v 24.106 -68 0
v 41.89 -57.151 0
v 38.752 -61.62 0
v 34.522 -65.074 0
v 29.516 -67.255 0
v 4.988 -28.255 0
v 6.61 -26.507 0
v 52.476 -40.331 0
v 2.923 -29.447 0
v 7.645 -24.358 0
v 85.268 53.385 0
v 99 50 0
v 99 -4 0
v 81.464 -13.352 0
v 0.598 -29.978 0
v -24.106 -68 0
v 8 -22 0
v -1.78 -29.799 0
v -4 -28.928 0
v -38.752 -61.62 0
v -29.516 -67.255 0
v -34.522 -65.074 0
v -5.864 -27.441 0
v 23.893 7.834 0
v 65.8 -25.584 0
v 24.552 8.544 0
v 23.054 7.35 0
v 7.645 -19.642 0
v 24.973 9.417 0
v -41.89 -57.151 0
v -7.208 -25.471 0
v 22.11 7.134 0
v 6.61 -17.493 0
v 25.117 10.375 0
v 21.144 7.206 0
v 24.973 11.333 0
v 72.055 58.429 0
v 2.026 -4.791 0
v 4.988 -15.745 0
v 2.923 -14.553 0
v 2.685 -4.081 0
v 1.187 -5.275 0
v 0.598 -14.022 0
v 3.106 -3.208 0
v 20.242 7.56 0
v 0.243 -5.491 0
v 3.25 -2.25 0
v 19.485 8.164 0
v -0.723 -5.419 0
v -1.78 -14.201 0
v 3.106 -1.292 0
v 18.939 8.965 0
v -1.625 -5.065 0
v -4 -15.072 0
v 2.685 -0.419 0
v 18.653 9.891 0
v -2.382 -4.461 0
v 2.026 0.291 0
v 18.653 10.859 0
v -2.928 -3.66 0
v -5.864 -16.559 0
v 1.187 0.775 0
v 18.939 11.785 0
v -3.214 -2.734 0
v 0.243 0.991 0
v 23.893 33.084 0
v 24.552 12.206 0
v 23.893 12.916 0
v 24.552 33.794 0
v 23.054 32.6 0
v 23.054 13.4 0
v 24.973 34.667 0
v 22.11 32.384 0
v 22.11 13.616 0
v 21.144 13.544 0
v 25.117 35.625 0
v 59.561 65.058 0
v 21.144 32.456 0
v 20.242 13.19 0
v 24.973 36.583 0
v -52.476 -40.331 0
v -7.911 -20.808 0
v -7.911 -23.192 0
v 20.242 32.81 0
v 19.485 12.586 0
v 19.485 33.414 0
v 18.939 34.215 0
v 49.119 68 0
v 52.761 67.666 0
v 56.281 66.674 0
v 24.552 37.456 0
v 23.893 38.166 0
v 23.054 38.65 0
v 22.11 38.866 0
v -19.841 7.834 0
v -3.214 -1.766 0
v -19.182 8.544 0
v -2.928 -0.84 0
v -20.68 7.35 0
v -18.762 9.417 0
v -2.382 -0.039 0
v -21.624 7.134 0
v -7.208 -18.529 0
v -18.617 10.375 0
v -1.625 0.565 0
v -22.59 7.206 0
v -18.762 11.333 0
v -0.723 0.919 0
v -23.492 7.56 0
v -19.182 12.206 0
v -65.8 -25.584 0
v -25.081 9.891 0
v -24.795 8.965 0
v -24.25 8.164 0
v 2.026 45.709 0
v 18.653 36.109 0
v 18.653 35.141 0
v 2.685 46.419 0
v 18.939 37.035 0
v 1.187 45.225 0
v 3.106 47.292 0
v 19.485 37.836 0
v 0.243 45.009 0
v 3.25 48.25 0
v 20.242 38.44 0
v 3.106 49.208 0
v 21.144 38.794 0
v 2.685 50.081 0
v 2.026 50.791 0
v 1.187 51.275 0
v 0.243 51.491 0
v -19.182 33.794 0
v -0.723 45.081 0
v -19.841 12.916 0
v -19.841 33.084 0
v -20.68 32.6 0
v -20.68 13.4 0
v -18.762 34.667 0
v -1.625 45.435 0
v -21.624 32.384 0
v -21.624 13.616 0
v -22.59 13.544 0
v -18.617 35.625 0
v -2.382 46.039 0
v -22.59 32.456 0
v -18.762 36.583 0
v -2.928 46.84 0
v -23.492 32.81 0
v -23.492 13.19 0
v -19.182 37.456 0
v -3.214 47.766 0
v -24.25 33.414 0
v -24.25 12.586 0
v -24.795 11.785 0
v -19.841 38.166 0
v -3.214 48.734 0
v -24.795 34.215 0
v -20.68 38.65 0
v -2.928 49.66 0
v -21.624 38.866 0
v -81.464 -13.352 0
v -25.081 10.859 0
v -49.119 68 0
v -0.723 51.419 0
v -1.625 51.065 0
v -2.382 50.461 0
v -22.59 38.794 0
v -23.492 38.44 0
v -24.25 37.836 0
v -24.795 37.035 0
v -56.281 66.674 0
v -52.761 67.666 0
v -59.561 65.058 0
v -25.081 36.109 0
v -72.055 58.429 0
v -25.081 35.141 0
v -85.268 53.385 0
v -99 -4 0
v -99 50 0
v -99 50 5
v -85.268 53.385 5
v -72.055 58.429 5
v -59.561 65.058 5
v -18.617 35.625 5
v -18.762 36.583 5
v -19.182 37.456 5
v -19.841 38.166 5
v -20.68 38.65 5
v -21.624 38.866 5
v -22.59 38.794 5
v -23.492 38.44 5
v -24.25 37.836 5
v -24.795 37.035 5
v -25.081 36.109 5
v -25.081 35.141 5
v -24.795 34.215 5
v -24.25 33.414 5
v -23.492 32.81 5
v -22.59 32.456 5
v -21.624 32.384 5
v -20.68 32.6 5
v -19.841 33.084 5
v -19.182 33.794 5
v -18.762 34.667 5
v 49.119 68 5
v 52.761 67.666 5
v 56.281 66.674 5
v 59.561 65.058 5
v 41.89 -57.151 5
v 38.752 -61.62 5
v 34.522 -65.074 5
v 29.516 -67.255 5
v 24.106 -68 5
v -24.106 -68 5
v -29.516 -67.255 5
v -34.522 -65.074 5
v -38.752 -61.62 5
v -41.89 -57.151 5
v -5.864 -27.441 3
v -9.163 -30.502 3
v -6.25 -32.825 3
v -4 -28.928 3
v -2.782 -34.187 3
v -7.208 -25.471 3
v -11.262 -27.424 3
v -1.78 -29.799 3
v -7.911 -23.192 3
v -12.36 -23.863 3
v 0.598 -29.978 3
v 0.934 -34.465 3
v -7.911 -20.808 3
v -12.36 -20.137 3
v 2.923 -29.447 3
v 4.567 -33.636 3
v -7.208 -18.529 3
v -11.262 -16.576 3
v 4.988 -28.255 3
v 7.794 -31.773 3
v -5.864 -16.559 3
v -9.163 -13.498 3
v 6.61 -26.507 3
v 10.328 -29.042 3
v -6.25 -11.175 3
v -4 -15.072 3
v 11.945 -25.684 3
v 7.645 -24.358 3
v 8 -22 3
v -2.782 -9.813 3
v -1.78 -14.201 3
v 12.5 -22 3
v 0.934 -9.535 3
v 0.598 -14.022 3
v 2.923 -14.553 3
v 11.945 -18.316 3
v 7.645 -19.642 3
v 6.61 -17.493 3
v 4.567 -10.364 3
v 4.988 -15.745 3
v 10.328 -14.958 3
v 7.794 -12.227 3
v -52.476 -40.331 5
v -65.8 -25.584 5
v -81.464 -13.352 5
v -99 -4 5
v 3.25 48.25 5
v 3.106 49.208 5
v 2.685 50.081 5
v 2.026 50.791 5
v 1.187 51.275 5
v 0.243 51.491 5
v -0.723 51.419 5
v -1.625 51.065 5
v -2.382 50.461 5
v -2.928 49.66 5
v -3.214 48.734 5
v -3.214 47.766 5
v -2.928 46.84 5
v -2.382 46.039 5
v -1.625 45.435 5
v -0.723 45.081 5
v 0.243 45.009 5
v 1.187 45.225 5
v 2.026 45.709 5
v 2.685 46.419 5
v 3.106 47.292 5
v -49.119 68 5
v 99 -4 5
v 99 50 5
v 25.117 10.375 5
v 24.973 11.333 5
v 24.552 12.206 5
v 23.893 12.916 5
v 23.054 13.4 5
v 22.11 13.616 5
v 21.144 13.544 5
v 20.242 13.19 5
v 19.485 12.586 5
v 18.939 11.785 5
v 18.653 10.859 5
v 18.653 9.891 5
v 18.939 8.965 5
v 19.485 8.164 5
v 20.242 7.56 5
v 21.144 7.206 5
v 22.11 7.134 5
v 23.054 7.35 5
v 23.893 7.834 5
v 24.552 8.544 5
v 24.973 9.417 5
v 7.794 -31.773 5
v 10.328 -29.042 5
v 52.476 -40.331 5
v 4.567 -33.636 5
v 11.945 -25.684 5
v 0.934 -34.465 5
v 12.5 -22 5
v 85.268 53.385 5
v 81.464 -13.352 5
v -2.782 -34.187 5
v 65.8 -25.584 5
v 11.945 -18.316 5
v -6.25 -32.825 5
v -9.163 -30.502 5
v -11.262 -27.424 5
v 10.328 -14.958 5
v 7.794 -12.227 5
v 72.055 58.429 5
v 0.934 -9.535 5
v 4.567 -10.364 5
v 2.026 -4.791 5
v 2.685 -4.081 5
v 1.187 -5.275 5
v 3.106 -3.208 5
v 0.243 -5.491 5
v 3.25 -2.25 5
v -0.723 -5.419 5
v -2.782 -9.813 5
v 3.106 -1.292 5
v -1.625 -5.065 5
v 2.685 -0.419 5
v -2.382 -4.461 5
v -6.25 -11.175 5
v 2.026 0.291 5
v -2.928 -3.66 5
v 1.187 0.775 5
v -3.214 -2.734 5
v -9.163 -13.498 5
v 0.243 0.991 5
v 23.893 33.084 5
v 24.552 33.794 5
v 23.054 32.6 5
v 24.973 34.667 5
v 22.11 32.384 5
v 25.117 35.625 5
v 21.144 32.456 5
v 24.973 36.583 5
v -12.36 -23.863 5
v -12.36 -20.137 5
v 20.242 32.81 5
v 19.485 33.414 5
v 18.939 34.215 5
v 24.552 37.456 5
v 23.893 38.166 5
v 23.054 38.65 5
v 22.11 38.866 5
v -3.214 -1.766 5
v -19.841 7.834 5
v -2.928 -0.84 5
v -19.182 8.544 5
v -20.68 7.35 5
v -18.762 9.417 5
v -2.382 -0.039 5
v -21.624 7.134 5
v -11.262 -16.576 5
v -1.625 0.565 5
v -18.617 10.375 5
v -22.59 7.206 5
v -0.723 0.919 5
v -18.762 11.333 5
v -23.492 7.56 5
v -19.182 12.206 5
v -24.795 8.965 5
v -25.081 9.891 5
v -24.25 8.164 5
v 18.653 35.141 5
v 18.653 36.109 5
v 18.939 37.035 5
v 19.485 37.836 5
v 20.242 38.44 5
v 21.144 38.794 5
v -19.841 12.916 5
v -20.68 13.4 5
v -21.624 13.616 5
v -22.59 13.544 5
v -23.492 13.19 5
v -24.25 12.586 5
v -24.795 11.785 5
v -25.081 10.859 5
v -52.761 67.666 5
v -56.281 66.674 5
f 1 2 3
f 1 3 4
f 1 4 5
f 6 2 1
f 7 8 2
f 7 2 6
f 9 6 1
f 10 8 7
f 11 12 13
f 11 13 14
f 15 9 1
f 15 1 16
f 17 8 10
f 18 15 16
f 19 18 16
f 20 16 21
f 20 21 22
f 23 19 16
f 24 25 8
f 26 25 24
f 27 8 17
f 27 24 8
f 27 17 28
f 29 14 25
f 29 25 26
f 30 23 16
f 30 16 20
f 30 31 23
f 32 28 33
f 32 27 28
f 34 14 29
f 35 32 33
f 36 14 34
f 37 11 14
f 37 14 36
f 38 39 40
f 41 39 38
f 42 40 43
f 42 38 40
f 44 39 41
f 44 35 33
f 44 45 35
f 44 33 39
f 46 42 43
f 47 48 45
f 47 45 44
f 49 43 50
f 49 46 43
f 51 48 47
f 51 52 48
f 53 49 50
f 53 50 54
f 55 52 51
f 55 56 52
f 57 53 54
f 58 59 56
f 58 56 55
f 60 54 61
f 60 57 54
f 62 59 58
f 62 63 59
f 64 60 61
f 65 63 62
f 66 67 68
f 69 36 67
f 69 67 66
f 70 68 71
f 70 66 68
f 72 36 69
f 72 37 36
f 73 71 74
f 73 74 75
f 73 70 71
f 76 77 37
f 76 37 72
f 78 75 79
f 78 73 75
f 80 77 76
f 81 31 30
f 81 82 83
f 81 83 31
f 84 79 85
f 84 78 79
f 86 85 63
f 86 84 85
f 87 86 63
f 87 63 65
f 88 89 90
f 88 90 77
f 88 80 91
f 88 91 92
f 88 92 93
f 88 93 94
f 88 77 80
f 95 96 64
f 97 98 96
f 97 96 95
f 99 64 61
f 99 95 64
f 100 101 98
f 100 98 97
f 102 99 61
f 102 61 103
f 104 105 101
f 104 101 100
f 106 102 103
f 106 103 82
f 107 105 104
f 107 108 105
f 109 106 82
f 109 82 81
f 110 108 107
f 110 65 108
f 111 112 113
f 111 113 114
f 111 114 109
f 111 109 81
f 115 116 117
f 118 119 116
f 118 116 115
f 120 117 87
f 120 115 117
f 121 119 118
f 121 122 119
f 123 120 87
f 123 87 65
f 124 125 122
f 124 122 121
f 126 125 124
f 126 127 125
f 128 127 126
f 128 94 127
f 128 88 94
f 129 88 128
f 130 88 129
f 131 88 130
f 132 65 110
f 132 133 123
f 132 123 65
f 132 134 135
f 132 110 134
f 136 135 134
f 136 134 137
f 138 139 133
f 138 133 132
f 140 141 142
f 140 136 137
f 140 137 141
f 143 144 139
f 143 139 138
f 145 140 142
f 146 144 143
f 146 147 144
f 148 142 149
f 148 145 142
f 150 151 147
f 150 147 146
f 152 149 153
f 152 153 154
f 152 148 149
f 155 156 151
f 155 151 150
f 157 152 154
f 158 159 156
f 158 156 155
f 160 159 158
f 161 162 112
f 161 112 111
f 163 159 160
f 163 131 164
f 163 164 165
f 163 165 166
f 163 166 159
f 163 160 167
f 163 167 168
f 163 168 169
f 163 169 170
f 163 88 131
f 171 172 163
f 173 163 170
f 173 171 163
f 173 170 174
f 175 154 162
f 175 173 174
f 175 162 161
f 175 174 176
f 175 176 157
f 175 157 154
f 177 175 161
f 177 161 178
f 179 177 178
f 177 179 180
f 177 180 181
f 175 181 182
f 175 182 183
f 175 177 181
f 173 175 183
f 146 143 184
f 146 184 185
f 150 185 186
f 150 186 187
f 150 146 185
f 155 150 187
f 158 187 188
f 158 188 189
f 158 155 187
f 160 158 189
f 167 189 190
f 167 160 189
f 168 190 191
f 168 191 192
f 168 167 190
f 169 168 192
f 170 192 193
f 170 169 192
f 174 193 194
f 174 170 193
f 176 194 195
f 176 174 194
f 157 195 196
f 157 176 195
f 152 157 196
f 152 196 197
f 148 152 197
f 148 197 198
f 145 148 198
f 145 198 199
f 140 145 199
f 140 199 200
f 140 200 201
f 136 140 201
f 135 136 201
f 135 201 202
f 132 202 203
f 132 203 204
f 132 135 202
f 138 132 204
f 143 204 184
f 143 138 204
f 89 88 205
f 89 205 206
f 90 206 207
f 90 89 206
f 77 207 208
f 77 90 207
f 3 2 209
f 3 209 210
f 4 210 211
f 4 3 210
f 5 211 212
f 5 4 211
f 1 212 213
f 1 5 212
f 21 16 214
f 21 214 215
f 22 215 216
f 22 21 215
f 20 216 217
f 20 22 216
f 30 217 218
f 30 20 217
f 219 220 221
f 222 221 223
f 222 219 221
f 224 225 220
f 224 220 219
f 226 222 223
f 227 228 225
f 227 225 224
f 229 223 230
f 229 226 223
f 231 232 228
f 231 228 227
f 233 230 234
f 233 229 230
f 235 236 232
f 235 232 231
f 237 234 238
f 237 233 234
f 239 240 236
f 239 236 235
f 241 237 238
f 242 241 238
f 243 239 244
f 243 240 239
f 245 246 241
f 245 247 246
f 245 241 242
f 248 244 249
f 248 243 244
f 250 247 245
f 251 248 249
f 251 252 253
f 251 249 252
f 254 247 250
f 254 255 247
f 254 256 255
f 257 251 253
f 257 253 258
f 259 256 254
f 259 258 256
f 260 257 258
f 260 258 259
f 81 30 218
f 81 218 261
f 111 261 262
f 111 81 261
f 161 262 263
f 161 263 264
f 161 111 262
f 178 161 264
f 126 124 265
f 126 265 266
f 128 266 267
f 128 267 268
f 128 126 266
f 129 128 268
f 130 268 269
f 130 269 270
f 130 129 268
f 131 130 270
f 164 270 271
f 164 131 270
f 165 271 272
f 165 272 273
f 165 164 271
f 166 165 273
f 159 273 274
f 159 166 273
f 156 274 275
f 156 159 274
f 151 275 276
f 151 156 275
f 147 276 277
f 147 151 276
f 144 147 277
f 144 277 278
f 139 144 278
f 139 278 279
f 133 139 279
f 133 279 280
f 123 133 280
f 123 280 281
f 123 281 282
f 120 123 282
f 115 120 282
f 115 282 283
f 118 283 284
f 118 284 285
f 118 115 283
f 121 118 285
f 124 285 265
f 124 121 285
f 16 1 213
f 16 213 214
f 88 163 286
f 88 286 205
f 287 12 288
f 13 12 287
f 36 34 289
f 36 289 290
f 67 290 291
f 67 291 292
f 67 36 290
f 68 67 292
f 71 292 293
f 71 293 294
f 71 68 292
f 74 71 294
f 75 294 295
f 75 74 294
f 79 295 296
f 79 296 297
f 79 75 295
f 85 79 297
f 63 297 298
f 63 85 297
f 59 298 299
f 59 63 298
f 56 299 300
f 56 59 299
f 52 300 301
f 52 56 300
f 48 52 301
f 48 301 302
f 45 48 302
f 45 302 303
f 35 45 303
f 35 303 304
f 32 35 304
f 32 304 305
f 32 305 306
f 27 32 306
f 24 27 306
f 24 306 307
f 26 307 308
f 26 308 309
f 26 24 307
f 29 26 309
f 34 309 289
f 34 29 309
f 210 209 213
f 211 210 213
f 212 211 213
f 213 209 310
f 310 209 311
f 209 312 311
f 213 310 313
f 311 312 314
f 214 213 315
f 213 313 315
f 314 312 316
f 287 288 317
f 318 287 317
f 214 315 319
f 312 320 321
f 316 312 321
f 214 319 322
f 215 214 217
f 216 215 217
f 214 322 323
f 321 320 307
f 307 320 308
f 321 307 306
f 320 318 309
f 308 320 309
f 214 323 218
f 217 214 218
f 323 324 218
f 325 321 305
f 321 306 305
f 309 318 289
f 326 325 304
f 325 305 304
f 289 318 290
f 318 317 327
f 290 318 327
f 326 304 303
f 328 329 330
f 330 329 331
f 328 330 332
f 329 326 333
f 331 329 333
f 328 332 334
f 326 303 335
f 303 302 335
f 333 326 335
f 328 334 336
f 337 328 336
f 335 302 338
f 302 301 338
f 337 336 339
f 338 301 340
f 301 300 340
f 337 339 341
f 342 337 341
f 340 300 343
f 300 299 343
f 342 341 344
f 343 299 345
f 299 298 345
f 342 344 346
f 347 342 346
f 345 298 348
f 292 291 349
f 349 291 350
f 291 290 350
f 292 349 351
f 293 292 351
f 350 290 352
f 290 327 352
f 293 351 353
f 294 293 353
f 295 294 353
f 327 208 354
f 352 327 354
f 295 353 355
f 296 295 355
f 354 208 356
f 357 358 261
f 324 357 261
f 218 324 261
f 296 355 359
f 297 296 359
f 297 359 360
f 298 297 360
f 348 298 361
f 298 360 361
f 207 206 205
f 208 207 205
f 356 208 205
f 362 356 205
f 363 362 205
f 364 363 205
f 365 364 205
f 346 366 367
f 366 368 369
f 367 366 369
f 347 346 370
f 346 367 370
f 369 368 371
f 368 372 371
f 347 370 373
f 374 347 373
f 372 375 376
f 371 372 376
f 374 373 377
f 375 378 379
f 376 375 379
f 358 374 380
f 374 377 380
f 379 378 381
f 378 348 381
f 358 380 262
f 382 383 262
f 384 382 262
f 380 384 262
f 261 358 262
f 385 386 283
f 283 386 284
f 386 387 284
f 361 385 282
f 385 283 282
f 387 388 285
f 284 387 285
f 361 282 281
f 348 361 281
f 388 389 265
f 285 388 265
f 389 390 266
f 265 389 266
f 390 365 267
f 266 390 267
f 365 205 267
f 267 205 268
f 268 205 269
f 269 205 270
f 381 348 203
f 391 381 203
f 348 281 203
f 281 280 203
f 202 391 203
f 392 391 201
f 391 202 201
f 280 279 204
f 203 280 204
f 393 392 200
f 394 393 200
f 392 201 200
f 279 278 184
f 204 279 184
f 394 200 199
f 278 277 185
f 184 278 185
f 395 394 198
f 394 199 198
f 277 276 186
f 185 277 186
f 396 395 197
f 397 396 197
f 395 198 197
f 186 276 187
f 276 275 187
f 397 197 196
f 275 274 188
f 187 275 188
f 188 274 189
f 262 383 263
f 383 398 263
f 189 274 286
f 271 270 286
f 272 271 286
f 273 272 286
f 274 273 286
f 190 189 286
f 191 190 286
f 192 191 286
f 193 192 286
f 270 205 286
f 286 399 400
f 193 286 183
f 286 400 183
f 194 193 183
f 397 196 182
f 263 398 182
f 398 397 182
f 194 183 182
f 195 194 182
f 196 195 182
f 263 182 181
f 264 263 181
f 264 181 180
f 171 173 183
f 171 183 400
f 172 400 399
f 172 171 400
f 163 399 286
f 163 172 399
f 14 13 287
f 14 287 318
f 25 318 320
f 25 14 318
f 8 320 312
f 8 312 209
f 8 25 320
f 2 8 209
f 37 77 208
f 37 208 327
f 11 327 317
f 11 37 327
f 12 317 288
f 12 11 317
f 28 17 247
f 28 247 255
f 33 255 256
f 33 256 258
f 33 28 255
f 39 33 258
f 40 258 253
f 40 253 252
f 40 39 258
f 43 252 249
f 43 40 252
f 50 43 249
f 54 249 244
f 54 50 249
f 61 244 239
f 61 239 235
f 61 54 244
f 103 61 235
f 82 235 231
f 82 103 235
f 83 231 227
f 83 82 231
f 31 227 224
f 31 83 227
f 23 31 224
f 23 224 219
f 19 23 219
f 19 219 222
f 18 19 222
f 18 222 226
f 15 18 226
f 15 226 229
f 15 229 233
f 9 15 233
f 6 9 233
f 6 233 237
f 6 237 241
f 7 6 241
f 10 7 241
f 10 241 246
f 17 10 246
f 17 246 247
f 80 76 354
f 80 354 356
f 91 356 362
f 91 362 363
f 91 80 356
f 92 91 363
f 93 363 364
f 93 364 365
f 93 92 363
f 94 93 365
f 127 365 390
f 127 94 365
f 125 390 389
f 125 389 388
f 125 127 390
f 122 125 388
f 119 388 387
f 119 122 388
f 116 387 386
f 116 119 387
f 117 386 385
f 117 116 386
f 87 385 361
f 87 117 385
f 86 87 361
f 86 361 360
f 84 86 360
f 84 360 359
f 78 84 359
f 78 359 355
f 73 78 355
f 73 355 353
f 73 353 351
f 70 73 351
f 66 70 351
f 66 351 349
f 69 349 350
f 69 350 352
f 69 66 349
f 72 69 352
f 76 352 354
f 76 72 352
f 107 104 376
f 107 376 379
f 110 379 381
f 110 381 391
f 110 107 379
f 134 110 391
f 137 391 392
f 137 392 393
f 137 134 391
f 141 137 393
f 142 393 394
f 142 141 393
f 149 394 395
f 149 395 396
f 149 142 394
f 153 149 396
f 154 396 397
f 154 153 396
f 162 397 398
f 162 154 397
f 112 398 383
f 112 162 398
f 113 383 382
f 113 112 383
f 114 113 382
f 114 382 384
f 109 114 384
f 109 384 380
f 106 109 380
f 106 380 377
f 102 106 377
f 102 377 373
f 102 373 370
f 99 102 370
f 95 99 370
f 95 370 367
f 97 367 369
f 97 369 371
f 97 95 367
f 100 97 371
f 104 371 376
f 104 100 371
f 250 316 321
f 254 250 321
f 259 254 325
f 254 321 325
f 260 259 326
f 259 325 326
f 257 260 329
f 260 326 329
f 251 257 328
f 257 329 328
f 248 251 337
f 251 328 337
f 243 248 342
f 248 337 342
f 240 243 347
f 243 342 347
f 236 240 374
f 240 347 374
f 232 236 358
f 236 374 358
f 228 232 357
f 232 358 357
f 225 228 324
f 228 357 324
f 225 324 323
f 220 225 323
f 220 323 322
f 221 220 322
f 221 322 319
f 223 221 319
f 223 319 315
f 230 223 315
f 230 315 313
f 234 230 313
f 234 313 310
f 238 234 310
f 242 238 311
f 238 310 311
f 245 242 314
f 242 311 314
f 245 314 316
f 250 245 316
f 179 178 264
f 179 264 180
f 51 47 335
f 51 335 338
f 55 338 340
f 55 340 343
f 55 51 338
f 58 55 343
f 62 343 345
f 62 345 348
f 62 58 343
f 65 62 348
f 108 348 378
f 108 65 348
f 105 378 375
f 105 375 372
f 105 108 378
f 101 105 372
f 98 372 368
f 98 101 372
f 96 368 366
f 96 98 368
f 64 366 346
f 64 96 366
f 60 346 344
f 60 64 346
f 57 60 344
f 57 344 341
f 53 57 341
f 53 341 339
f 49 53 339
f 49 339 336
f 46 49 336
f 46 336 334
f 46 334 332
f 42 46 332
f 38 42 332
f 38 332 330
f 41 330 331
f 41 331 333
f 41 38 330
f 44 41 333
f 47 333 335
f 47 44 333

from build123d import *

# Parameters (mm, degrees)
ESBO_O1_R                = 3.25
ESBO_O1_R_2              = 8
RESSALTO_EXTRUS_O1_DEPTH = 5
ESBO_O2_R                = 12.5
ESBO_O2_R_2              = 8
CORTE_EXTRUS_O1_DEPTH    = 2


with BuildPart() as part:
    # Esboço1 → Ressalto-extrusão1 (new body)
    with BuildSketch(Plane.XY):
        with BuildLine():
            Line((-49.119135606, 68), (49.119135606, 68))
            ThreePointArc((49.119135606, 68), (54.543435225, 67.250375935), (59.56111629, 65.057697365))
            ThreePointArc((59.56111629, 65.057697365), (78.583692726, 55.703629757), (99, 50))
            Line((99, 50), (99, -4))
            ThreePointArc((99, -4), (65.800143376, -25.584477196), (41.890064111, -57.150728877))
            ThreePointArc((41.890064111, -57.150728877), (34.522230169, -65.073584532), (24.106246719, -68))
            Line((24.106246719, -68), (-24.106246719, -68))
            ThreePointArc((-24.106246719, -68), (-34.522230169, -65.073584532), (-41.890064111, -57.150728877))
            ThreePointArc((-41.890064111, -57.150728877), (-65.800143376, -25.584477196), (-99, -4))
            Line((-99, -4), (-99, 50))
            ThreePointArc((-99, 50), (-78.583692726, 55.703629757), (-59.56111629, 65.057697365))
            ThreePointArc((-59.56111629, 65.057697365), (-54.543435225, 67.250375935), (-49.119135606, 68))
        make_face()
        with Locations((0, 48.25)):
            Circle(ESBO_O1_R, mode=Mode.SUBTRACT)
        with Locations((21.867141446, 35.625)):
            Circle(ESBO_O1_R, mode=Mode.SUBTRACT)
        with Locations((21.867141446, 10.375)):
            Circle(ESBO_O1_R, mode=Mode.SUBTRACT)
        with Locations((0, -2.25)):
            Circle(ESBO_O1_R, mode=Mode.SUBTRACT)
        with Locations((-21.867141446, 10.375)):
            Circle(ESBO_O1_R, mode=Mode.SUBTRACT)
        with Locations((-21.867141446, 35.625)):
            Circle(ESBO_O1_R, mode=Mode.SUBTRACT)
        with Locations((0, -22)):
            Circle(ESBO_O1_R_2, mode=Mode.SUBTRACT)
    extrude(amount=RESSALTO_EXTRUS_O1_DEPTH)

    # Esboço2 → Corte-extrusão1 (cut)
    with BuildSketch(Plane.XY.offset(5)):
        with Locations((0, -22)):
            Circle(ESBO_O2_R)
        with Locations((0, -22)):
            Circle(ESBO_O2_R_2, mode=Mode.SUBTRACT)
    extrude(amount=-CORTE_EXTRUS_O1_DEPTH, mode=Mode.SUBTRACT)


solid = part.part
